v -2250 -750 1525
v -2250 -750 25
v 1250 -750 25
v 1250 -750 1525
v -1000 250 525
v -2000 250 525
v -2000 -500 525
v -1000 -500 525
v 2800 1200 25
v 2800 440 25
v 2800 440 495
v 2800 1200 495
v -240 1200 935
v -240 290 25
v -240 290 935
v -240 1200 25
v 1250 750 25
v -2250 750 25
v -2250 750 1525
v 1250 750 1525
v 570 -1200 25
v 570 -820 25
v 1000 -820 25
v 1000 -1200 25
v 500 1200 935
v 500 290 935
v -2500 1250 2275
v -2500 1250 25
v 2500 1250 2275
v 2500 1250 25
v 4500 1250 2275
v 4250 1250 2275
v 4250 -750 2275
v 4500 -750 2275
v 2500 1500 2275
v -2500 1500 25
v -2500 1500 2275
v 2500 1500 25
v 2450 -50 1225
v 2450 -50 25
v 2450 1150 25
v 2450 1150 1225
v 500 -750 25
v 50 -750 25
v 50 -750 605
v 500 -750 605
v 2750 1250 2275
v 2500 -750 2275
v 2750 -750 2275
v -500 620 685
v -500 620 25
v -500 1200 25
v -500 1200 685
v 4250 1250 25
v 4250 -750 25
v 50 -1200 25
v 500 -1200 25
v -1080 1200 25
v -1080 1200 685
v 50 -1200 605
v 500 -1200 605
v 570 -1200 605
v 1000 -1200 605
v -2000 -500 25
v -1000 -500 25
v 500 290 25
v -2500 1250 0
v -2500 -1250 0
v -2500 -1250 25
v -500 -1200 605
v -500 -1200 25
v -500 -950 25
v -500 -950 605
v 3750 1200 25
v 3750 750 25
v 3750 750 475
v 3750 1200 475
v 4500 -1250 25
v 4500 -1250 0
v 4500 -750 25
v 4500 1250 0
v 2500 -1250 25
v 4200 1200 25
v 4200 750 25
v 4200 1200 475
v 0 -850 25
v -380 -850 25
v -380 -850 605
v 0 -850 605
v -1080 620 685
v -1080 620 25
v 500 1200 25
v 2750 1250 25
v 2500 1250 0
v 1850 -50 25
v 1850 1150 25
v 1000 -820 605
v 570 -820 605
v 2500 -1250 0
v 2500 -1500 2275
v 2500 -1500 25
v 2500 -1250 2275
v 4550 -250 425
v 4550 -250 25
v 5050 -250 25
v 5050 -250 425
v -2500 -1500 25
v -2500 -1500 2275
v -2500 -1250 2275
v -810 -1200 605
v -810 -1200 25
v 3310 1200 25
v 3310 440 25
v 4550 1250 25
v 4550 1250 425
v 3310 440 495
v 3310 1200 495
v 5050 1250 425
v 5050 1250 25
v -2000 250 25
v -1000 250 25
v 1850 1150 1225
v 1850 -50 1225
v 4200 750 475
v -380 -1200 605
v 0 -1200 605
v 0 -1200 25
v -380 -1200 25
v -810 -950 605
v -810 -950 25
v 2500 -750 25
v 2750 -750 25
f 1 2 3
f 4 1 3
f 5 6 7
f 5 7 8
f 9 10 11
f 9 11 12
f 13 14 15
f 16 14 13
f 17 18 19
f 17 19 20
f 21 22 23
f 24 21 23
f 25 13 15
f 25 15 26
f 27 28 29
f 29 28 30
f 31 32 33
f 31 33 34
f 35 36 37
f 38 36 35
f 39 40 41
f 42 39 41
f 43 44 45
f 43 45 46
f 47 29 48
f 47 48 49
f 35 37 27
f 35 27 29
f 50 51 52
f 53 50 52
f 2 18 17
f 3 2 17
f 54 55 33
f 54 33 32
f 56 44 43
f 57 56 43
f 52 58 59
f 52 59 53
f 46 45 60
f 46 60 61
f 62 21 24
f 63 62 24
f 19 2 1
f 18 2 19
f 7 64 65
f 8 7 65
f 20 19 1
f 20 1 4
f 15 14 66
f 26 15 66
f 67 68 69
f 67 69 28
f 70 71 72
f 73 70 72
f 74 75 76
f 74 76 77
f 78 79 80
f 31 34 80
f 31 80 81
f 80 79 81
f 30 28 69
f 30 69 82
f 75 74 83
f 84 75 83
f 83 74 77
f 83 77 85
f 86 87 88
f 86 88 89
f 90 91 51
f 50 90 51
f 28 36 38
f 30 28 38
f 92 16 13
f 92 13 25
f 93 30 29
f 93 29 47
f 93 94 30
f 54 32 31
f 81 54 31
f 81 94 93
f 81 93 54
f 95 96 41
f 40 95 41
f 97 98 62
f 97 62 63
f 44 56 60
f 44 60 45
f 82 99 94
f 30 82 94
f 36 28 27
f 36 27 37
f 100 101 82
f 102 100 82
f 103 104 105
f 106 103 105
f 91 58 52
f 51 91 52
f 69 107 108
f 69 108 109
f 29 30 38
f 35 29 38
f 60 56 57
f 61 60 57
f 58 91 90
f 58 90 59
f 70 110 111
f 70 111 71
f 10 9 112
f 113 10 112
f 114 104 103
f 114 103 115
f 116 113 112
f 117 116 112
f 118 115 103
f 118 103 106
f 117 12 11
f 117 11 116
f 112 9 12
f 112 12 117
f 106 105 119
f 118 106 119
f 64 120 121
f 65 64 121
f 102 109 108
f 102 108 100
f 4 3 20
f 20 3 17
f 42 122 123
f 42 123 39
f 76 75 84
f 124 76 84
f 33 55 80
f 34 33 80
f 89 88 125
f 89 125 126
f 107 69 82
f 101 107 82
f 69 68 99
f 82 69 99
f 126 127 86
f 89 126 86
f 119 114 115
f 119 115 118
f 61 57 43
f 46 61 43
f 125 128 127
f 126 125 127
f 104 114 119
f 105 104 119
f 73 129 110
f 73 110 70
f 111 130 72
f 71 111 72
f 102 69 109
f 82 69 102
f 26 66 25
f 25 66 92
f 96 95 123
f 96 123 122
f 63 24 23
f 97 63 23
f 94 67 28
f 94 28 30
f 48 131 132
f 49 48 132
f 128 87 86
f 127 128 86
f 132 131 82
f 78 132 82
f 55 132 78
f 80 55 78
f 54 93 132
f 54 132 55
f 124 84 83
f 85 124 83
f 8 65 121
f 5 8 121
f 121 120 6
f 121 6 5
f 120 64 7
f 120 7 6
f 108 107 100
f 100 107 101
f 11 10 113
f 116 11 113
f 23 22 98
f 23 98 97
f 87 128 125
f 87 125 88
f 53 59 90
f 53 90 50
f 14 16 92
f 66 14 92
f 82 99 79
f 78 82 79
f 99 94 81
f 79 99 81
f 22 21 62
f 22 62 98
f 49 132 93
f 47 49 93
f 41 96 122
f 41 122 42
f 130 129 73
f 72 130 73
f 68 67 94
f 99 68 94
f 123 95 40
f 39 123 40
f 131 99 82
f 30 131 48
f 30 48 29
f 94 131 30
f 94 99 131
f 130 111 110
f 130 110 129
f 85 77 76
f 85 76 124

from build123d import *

# Parameters (mm, degrees)
F0_W      = 5000
F0_H      = 2500
F1_DEPTH  = 25
F2_W      = 2000
F2_H      = 2500
F3_DEPTH  = 25
F4_W      = 5000
F4_H      = 250
F4_W_2    = 250
F4_H_2    = 2000
F5_DEPTH  = 2250
F6_W      = 3500
F6_H      = 1500
F7_DEPTH  = 1500
F8_W      = 740
F8_H      = 910
F9_DEPTH  = 910
F10_W     = 600
F10_H     = 1200
F11_DEPTH = 1200
F12_W     = 580
F12_H     = 580
F13_DEPTH = 660
F14_W     = 500
F14_H     = 1500
F15_DEPTH = 400
F16_W     = 510
F16_H     = 760
F17_DEPTH = 470
F18_W     = 450
F18_H     = 450
F19_DEPTH = 450
F20_W     = 380
F20_H     = 350
F21_DEPTH = 580
F20_W_2   = 310
F20_H_2   = 250
F20_W_3   = 450
F20_H_3   = 450
F20_W_4   = 430
F20_H_4   = 380
F22_W     = 1000
F22_H     = 750
F23_DEPTH = 500


with BuildPart() as f1:
    # F0 (on Top) → F1 (new body)
    with BuildSketch(Plane.XY):
        Rectangle(F0_W, F0_H)
    extrude(amount=F1_DEPTH)


with BuildPart() as f3:
    # F2 (on Top) → F3 (new body)
    with BuildSketch(Plane.XY):
        with Locations((3500, 0)):
            Rectangle(F2_W, F2_H)
    extrude(amount=F3_DEPTH)

    # F4 (on face) → F5 (join)
    with BuildSketch(Plane.XY.offset(25)):
        with Locations((0, -1375)):
            Rectangle(F4_W, F4_H)
        with Locations((0, 1375)):
            Rectangle(F4_W, F4_H)
        with Locations((2625, 250)):
            Rectangle(F4_W_2, F4_H_2)
        with Locations((4375, 250)):
            Rectangle(F4_W_2, F4_H_2)
    extrude(amount=F5_DEPTH)


with BuildPart() as f7:
    # F6 (on face) → F7 (new body)
    with BuildSketch(Plane.XY.offset(25)):
        with Locations((-500, 0)):
            Rectangle(F6_W, F6_H)
    extrude(amount=F7_DEPTH)


with BuildPart() as f9:
    # F8 (on face) → F9 (new body)
    with BuildSketch(Plane.XY.offset(25)):
        with Locations((130, 745)):
            Rectangle(F8_W, F8_H)
    extrude(amount=F9_DEPTH)


with BuildPart() as f11:
    # F10 (on face) → F11 (new body)
    with BuildSketch(Plane.XY.offset(25)):
        with Locations((2150, 550)):
            Rectangle(F10_W, F10_H)
    extrude(amount=F11_DEPTH)


with BuildPart() as f13:
    # F12 (on face) → F13 (new body)
    with BuildSketch(Plane.XY.offset(25)):
        with Locations((-790, 910)):
            Rectangle(F12_W, F12_H)
    extrude(amount=F13_DEPTH)


with BuildPart() as f15:
    # F14 (on face) → F15 (new body)
    with BuildSketch(Plane.XY.offset(25)):
        with Locations((4800, 500)):
            Rectangle(F14_W, F14_H)
    extrude(amount=F15_DEPTH)


with BuildPart() as f17:
    # F16 (on face) → F17 (new body)
    with BuildSketch(Plane.XY.offset(25)):
        with Locations((3055, 820)):
            Rectangle(F16_W, F16_H)
    extrude(amount=F17_DEPTH)


with BuildPart() as f19:
    # F18 (on face) → F19 (new body)
    with BuildSketch(Plane.XY.offset(25)):
        with Locations((3975, 975)):
            Rectangle(F18_W, F18_H)
    extrude(amount=F19_DEPTH)


with BuildPart() as f21:
    # F20 (on face) → F21 (new body)
    with BuildSketch(Plane.XY.offset(25)):
        with Locations((-190, -1025)):
            Rectangle(F20_W, F20_H)
    extrude(amount=F21_DEPTH)


with BuildPart() as f21b:
    # F20 (on face) → F21, piece 2 (new body)
    with BuildSketch(Plane.XY.offset(25)):
        with Locations((-655, -1075)):
            Rectangle(F20_W_2, F20_H_2)
    extrude(amount=F21_DEPTH)


with BuildPart() as f21c:
    # F20 (on face) → F21, piece 3 (new body)
    with BuildSketch(Plane.XY.offset(25)):
        with Locations((275, -975)):
            Rectangle(F20_W_3, F20_H_3)
    extrude(amount=F21_DEPTH)


with BuildPart() as f21d:
    # F20 (on face) → F21, piece 4 (new body)
    with BuildSketch(Plane.XY.offset(25)):
        with Locations((785, -1010)):
            Rectangle(F20_W_4, F20_H_4)
    extrude(amount=F21_DEPTH)


with BuildPart() as f23:
    # F22 (on face) → F23 (new body)
    with BuildSketch(Plane.XY.offset(25)):
        with Locations((-1500, -125)):
            Rectangle(F22_W, F22_H)
    extrude(amount=F23_DEPTH)


solid = Compound([f1.part, f3.part, f7.part, f9.part, f11.part, f13.part, f15.part, f17.part, f19.part, f21.part, f21b.part, f21c.part, f21d.part, f23.part])
